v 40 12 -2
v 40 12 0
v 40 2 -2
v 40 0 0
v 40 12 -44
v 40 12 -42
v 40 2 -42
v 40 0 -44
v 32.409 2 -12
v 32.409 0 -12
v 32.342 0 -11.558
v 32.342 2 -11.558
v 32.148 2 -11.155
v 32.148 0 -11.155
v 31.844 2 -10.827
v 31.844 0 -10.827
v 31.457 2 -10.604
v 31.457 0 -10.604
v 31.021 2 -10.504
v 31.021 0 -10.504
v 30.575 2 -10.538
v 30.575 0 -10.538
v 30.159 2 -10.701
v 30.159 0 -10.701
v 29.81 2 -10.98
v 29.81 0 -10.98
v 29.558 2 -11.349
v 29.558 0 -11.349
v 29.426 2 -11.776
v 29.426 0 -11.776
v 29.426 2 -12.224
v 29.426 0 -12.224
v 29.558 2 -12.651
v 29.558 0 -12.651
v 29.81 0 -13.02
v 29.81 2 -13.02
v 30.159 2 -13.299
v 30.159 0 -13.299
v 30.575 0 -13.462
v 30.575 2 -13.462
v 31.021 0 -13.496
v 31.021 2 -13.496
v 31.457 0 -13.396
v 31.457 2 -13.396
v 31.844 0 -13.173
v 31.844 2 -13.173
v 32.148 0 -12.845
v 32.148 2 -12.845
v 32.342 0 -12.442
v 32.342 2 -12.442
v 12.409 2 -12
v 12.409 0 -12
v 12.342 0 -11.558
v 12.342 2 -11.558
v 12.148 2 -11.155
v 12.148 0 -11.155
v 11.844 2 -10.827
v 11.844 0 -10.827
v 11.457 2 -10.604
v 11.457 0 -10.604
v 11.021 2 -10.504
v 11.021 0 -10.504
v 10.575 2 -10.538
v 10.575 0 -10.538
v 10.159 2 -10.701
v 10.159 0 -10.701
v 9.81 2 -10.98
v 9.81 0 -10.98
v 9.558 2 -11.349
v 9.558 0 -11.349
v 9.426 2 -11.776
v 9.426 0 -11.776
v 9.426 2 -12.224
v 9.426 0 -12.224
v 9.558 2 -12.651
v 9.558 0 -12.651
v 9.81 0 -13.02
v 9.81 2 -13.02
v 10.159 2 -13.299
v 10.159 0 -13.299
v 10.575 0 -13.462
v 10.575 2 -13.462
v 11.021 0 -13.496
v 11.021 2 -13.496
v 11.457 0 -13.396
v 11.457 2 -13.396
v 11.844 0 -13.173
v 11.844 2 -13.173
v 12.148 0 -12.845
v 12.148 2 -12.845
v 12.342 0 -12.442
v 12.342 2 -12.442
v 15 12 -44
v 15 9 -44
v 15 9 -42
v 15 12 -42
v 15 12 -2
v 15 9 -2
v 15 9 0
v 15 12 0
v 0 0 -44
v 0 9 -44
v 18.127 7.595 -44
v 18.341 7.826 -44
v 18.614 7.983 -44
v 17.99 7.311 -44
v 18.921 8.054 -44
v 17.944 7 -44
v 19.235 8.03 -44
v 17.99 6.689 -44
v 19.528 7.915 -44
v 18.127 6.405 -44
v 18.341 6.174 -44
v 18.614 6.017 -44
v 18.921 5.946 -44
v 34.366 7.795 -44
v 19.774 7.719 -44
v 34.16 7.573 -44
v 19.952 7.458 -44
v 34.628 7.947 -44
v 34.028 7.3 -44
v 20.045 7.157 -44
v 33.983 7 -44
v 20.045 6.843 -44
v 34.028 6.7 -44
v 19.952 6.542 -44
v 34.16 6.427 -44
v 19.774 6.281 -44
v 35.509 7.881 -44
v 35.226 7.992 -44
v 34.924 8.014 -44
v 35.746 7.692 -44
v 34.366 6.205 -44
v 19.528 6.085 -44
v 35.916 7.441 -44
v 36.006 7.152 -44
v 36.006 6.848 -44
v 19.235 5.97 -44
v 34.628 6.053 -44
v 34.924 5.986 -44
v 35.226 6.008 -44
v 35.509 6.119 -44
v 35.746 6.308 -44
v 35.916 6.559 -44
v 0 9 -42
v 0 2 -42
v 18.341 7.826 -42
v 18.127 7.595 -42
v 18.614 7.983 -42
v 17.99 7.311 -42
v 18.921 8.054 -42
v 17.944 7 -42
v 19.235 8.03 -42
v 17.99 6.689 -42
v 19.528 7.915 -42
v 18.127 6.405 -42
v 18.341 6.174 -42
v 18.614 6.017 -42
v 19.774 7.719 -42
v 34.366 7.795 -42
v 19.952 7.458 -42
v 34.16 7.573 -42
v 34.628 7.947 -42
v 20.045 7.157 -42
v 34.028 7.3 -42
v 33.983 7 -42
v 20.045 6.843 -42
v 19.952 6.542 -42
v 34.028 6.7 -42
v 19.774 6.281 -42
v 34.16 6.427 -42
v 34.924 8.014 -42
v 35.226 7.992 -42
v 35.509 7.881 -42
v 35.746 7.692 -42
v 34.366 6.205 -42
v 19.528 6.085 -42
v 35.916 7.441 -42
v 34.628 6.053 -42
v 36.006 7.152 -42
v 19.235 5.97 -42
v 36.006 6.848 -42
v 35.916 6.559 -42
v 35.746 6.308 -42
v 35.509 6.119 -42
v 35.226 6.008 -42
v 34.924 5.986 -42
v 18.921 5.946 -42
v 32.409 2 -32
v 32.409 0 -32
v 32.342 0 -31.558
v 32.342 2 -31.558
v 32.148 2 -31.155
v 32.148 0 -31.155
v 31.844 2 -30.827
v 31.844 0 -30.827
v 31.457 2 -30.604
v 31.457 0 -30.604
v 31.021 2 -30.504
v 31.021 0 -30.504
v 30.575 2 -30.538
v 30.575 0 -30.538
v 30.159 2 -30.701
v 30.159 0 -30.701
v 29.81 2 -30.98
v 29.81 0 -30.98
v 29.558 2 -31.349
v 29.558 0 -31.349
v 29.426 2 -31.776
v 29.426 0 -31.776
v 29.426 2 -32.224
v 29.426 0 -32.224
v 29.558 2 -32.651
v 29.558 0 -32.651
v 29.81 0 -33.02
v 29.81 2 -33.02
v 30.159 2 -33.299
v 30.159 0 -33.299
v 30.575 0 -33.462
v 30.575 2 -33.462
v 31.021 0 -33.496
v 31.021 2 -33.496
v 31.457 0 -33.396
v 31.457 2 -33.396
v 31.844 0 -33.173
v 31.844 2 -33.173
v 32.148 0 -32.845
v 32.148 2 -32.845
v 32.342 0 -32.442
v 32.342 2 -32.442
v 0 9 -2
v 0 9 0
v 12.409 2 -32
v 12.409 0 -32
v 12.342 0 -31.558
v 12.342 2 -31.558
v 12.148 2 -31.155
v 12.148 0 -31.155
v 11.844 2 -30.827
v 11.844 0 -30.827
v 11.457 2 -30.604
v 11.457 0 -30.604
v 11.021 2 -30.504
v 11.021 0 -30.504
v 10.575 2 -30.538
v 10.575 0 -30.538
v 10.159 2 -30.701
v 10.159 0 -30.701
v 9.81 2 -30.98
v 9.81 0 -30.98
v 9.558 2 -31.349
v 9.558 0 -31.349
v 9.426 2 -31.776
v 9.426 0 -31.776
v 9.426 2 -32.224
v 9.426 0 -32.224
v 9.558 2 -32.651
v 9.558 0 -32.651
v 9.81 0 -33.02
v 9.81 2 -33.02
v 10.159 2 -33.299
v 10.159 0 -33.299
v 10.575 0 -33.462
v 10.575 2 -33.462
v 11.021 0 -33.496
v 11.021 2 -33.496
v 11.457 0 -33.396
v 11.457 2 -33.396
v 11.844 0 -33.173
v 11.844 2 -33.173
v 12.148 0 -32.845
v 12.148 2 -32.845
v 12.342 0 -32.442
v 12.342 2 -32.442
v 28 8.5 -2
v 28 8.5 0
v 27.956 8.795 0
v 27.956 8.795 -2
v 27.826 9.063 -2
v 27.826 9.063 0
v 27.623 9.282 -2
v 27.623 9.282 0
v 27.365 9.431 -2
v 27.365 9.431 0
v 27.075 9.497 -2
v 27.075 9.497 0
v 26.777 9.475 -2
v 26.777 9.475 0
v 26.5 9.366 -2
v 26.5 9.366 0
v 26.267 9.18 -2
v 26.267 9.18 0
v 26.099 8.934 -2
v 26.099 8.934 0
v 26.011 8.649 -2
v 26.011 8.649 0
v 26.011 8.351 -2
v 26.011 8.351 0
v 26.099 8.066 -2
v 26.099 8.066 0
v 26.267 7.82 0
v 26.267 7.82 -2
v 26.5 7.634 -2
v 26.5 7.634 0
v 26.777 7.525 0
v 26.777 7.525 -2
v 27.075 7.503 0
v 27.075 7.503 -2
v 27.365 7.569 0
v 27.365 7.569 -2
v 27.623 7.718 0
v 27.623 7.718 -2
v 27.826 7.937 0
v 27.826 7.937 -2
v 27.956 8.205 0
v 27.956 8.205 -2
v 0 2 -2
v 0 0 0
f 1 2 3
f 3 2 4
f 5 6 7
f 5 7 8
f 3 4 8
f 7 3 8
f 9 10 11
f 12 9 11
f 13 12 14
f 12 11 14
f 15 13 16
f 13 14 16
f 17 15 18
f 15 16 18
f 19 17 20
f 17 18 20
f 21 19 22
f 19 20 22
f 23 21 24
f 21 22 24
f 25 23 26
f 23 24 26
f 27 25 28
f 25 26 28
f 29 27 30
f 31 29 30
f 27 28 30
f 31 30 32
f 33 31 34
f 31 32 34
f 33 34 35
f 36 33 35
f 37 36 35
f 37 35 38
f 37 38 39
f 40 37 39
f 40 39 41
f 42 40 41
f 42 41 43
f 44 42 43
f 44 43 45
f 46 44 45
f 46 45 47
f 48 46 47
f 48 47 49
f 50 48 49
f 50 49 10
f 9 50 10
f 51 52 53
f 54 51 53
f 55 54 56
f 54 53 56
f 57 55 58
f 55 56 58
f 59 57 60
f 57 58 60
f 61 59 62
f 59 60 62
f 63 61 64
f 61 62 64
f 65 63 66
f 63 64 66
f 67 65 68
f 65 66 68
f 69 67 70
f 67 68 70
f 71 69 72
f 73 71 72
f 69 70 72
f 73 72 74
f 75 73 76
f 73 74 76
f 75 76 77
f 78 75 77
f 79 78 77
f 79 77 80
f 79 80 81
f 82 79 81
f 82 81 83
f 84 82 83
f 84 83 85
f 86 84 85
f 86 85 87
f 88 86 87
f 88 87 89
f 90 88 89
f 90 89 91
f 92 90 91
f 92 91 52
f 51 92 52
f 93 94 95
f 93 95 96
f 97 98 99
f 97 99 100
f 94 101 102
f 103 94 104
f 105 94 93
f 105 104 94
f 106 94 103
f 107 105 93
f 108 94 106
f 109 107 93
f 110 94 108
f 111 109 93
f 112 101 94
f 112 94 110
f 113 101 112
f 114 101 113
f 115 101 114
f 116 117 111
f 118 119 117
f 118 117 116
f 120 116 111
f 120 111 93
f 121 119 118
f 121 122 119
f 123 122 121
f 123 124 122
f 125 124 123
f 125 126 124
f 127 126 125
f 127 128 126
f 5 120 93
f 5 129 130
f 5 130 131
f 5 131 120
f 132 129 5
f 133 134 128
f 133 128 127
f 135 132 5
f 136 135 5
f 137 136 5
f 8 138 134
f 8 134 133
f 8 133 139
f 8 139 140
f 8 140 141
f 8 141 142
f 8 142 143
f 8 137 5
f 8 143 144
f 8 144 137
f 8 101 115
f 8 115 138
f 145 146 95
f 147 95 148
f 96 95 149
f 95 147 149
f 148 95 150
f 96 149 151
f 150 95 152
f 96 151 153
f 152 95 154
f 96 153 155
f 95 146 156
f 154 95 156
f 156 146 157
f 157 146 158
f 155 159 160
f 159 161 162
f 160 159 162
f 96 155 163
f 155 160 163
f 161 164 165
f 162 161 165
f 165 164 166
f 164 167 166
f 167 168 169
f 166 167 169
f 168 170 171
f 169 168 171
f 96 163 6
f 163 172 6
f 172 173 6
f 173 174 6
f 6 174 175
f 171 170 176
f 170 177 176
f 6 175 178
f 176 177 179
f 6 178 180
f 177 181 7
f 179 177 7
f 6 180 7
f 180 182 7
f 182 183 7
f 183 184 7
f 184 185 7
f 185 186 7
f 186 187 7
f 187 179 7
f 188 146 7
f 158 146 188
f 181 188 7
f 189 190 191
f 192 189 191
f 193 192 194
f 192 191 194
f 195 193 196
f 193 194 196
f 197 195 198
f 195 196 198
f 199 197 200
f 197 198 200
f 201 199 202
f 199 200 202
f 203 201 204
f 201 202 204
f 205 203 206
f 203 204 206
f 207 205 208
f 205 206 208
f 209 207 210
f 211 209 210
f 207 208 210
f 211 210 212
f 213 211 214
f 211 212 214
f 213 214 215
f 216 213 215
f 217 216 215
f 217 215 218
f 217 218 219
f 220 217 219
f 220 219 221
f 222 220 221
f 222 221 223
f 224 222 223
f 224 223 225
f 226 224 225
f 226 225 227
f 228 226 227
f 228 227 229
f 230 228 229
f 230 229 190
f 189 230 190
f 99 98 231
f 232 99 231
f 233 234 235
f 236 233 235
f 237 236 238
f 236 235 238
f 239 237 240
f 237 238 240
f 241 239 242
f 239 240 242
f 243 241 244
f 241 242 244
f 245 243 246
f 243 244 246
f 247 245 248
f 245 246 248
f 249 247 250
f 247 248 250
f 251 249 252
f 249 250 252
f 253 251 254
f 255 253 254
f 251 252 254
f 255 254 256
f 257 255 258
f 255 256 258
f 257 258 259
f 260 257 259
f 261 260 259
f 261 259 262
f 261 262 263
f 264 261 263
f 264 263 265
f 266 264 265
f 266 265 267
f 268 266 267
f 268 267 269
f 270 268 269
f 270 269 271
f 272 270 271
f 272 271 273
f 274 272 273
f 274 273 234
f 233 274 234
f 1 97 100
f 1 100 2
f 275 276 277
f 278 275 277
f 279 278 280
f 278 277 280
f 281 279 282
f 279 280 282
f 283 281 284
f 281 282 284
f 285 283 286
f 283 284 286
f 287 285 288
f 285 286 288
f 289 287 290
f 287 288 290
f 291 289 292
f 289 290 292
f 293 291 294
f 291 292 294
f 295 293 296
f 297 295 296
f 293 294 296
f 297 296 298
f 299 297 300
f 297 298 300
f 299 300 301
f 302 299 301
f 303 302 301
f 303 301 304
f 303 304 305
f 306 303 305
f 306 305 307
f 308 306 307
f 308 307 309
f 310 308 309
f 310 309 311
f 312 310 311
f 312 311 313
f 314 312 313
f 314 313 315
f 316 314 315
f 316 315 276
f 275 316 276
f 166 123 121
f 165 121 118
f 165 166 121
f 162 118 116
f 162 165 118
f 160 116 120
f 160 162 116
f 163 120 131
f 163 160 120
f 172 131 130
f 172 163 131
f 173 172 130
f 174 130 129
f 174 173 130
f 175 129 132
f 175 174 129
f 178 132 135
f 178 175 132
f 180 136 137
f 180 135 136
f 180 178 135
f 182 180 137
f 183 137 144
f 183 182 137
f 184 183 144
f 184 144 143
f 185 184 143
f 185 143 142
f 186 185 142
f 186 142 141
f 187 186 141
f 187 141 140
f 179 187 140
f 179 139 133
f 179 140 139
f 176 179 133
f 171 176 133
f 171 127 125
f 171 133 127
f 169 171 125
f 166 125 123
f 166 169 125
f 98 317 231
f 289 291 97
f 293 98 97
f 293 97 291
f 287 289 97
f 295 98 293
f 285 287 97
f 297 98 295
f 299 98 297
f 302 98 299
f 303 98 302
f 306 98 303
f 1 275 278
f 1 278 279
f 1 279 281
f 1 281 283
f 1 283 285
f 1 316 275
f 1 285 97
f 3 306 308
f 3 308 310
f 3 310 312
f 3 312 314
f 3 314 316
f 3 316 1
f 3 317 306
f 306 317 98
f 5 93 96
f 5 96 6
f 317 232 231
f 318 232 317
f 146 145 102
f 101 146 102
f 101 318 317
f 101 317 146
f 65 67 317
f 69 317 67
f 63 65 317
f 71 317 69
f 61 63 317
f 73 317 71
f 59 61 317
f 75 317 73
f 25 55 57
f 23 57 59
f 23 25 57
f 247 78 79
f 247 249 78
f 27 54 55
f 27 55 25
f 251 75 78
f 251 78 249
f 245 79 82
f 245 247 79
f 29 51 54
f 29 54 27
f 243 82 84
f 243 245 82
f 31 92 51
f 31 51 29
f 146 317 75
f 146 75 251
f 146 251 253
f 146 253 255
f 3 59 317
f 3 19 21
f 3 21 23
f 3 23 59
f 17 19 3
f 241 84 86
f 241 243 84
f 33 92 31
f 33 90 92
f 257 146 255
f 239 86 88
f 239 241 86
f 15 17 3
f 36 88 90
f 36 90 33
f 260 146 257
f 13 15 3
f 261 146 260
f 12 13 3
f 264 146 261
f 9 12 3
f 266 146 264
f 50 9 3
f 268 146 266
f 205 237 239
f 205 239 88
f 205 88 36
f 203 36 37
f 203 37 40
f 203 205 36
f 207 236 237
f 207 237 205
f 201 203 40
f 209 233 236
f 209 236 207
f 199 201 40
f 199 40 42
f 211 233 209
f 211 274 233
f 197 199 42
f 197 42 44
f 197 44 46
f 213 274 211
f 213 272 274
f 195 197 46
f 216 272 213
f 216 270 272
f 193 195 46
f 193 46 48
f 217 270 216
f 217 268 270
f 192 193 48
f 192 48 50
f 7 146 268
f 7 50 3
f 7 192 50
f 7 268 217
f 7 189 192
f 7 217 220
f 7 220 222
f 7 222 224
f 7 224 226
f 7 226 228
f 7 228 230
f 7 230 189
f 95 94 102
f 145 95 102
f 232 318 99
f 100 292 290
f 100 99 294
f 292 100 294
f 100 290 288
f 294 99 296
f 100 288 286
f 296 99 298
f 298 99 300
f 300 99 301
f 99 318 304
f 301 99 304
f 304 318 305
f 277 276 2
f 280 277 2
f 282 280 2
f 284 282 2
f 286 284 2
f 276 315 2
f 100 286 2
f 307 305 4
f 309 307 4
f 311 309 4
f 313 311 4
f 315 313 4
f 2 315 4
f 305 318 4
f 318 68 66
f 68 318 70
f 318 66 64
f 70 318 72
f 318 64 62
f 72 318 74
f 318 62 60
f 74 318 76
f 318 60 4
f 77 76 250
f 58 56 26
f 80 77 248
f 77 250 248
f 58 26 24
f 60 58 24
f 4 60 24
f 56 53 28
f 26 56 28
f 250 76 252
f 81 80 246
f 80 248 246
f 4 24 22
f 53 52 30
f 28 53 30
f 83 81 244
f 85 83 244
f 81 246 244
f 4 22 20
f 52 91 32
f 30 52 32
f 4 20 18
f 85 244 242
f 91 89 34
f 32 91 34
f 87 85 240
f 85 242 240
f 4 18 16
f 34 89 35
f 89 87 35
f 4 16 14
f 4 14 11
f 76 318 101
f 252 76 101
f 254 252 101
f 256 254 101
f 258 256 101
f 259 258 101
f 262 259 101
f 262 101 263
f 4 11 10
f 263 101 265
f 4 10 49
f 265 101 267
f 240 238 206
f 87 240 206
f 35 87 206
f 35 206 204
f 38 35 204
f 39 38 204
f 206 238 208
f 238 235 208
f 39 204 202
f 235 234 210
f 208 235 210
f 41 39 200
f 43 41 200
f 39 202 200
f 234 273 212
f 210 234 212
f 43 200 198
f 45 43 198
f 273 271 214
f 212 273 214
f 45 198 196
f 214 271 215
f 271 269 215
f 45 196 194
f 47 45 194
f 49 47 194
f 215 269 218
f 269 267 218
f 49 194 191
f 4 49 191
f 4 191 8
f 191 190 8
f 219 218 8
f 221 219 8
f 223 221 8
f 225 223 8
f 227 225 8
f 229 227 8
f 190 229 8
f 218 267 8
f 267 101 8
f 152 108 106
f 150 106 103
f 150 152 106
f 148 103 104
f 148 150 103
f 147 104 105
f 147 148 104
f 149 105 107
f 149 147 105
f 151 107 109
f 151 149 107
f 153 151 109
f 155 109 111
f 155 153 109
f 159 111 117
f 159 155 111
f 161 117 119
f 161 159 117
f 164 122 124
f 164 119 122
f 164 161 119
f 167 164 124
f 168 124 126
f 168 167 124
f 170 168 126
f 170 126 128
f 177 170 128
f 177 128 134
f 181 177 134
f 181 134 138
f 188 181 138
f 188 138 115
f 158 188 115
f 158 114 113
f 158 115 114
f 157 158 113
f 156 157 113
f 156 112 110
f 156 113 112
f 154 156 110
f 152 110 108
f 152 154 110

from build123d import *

# Parameters (mm, degrees)
SKETCH1_W           = 40
SKETCH1_H           = 44
BOSS_EXTRUDE1_DEPTH = 2
SKETCH2_W           = 40
SKETCH2_H           = 2
BOSS_EXTRUDE2_DEPTH = 10
SKETCH3_W           = 15
SKETCH3_H           = 3
CUT_EXTRUDE2_DEPTH  = 45
CUT_EXTRUDE3_REACH  = 4
SKETCH4_R           = 1.017178614
SKETCH4_R_2         = 1.056475415
CUT_EXTRUDE4_REACH  = 46
SKETCH5_R           = 1
CUT_EXTRUDE5_REACH  = 14
SKETCH6_R           = 1.5


with BuildPart() as part:
    # Sketch1 → Boss-Extrude1 (new body)
    with BuildSketch(Plane(origin=(0, 0, 0), x_dir=(1, 0, 0), z_dir=(0, 1, 0))):
        with Locations((20, 22)):
            Rectangle(SKETCH1_W, SKETCH1_H)
    extrude(amount=BOSS_EXTRUDE1_DEPTH)

    # Sketch2 → Boss-Extrude2 (add)
    with BuildSketch(Plane(origin=(0, 2, 0), x_dir=(1, 0, 0), z_dir=(0, 1, 0))):
        with Locations((20, 43)):
            Rectangle(SKETCH2_W, SKETCH2_H)
        with Locations((20, 1)):
            Rectangle(SKETCH2_W, SKETCH2_H)
    extrude(amount=BOSS_EXTRUDE2_DEPTH)

    # Sketch3 → Cut-Extrude2 (cut, through all)
    with BuildSketch(Plane(origin=(0, 0, -44), x_dir=(-1, 0, 0), z_dir=(0, 0, -1))):
        with Locations((-7.5, 10.5)):
            Rectangle(SKETCH3_W, SKETCH3_H)
    extrude(amount=-CUT_EXTRUDE2_DEPTH, mode=Mode.SUBTRACT)

    # Sketch4 → Cut-Extrude3 (cut, up to next)
    with BuildSketch(Plane(origin=(0, 0, -42), x_dir=(-1, 0, 0), z_dir=(0, 0, -1)), mode=Mode.PRIVATE) as cut_extrude3_sk1:
        with Locations((-35, 7)):
            Circle(SKETCH4_R)
    cut_extrude3_tool1 = extrude(cut_extrude3_sk1.sketch, amount=CUT_EXTRUDE3_REACH, mode=Mode.PRIVATE) & part.part
    add(cut_extrude3_tool1.solids().sort_by_distance((35, 7, -42))[0], mode=Mode.SUBTRACT)
    # Sketch4 → Cut-Extrude3 (cut, up to next)
    with BuildSketch(Plane(origin=(0, 0, -42), x_dir=(-1, 0, 0), z_dir=(0, 0, -1)), mode=Mode.PRIVATE) as cut_extrude3_sk2:
        with Locations((-19, 7)):
            Circle(SKETCH4_R_2)
    cut_extrude3_tool2 = extrude(cut_extrude3_sk2.sketch, amount=CUT_EXTRUDE3_REACH, mode=Mode.PRIVATE) & part.part
    add(cut_extrude3_tool2.solids().sort_by_distance((19, 7, -42))[0], mode=Mode.SUBTRACT)

    # Sketch5 → Cut-Extrude4 (cut, up to next)
    with BuildSketch(Plane.XY, mode=Mode.PRIVATE) as cut_extrude4_sk1:
        with Locations((27, 8.5)):
            Circle(SKETCH5_R)
    cut_extrude4_tool1 = extrude(cut_extrude4_sk1.sketch, amount=-CUT_EXTRUDE4_REACH, mode=Mode.PRIVATE) & part.part
    add(cut_extrude4_tool1.solids().sort_by_distance((27, 8.5, 0))[0], mode=Mode.SUBTRACT)

    # Sketch6 → Cut-Extrude5 (cut, up to next)
    with BuildSketch(Plane.XZ, mode=Mode.PRIVATE) as cut_extrude5_sk1:
        with Locations((10.909090909, -32)):
            Circle(SKETCH6_R)
    cut_extrude5_tool1 = extrude(cut_extrude5_sk1.sketch, amount=-CUT_EXTRUDE5_REACH, mode=Mode.PRIVATE) & part.part
    add(cut_extrude5_tool1.solids().sort_by_distance((10.909091, 0, -32))[0], mode=Mode.SUBTRACT)
    # Sketch6 → Cut-Extrude5 (cut, up to next)
    with BuildSketch(Plane.XZ, mode=Mode.PRIVATE) as cut_extrude5_sk2:
        with Locations((10.909090909, -12)):
            Circle(SKETCH6_R)
    cut_extrude5_tool2 = extrude(cut_extrude5_sk2.sketch, amount=-CUT_EXTRUDE5_REACH, mode=Mode.PRIVATE) & part.part
    add(cut_extrude5_tool2.solids().sort_by_distance((10.909091, 0, -12))[0], mode=Mode.SUBTRACT)
    # Sketch6 → Cut-Extrude5 (cut, up to next)
    with BuildSketch(Plane.XZ, mode=Mode.PRIVATE) as cut_extrude5_sk3:
        with Locations((30.909090909, -12)):
            Circle(SKETCH6_R)
    cut_extrude5_tool3 = extrude(cut_extrude5_sk3.sketch, amount=-CUT_EXTRUDE5_REACH, mode=Mode.PRIVATE) & part.part
    add(cut_extrude5_tool3.solids().sort_by_distance((30.909091, 0, -12))[0], mode=Mode.SUBTRACT)
    # Sketch6 → Cut-Extrude5 (cut, up to next)
    with BuildSketch(Plane.XZ, mode=Mode.PRIVATE) as cut_extrude5_sk4:
        with Locations((30.909090909, -32)):
            Circle(SKETCH6_R)
    cut_extrude5_tool4 = extrude(cut_extrude5_sk4.sketch, amount=-CUT_EXTRUDE5_REACH, mode=Mode.PRIVATE) & part.part
    add(cut_extrude5_tool4.solids().sort_by_distance((30.909091, 0, -32))[0], mode=Mode.SUBTRACT)


solid = part.part
